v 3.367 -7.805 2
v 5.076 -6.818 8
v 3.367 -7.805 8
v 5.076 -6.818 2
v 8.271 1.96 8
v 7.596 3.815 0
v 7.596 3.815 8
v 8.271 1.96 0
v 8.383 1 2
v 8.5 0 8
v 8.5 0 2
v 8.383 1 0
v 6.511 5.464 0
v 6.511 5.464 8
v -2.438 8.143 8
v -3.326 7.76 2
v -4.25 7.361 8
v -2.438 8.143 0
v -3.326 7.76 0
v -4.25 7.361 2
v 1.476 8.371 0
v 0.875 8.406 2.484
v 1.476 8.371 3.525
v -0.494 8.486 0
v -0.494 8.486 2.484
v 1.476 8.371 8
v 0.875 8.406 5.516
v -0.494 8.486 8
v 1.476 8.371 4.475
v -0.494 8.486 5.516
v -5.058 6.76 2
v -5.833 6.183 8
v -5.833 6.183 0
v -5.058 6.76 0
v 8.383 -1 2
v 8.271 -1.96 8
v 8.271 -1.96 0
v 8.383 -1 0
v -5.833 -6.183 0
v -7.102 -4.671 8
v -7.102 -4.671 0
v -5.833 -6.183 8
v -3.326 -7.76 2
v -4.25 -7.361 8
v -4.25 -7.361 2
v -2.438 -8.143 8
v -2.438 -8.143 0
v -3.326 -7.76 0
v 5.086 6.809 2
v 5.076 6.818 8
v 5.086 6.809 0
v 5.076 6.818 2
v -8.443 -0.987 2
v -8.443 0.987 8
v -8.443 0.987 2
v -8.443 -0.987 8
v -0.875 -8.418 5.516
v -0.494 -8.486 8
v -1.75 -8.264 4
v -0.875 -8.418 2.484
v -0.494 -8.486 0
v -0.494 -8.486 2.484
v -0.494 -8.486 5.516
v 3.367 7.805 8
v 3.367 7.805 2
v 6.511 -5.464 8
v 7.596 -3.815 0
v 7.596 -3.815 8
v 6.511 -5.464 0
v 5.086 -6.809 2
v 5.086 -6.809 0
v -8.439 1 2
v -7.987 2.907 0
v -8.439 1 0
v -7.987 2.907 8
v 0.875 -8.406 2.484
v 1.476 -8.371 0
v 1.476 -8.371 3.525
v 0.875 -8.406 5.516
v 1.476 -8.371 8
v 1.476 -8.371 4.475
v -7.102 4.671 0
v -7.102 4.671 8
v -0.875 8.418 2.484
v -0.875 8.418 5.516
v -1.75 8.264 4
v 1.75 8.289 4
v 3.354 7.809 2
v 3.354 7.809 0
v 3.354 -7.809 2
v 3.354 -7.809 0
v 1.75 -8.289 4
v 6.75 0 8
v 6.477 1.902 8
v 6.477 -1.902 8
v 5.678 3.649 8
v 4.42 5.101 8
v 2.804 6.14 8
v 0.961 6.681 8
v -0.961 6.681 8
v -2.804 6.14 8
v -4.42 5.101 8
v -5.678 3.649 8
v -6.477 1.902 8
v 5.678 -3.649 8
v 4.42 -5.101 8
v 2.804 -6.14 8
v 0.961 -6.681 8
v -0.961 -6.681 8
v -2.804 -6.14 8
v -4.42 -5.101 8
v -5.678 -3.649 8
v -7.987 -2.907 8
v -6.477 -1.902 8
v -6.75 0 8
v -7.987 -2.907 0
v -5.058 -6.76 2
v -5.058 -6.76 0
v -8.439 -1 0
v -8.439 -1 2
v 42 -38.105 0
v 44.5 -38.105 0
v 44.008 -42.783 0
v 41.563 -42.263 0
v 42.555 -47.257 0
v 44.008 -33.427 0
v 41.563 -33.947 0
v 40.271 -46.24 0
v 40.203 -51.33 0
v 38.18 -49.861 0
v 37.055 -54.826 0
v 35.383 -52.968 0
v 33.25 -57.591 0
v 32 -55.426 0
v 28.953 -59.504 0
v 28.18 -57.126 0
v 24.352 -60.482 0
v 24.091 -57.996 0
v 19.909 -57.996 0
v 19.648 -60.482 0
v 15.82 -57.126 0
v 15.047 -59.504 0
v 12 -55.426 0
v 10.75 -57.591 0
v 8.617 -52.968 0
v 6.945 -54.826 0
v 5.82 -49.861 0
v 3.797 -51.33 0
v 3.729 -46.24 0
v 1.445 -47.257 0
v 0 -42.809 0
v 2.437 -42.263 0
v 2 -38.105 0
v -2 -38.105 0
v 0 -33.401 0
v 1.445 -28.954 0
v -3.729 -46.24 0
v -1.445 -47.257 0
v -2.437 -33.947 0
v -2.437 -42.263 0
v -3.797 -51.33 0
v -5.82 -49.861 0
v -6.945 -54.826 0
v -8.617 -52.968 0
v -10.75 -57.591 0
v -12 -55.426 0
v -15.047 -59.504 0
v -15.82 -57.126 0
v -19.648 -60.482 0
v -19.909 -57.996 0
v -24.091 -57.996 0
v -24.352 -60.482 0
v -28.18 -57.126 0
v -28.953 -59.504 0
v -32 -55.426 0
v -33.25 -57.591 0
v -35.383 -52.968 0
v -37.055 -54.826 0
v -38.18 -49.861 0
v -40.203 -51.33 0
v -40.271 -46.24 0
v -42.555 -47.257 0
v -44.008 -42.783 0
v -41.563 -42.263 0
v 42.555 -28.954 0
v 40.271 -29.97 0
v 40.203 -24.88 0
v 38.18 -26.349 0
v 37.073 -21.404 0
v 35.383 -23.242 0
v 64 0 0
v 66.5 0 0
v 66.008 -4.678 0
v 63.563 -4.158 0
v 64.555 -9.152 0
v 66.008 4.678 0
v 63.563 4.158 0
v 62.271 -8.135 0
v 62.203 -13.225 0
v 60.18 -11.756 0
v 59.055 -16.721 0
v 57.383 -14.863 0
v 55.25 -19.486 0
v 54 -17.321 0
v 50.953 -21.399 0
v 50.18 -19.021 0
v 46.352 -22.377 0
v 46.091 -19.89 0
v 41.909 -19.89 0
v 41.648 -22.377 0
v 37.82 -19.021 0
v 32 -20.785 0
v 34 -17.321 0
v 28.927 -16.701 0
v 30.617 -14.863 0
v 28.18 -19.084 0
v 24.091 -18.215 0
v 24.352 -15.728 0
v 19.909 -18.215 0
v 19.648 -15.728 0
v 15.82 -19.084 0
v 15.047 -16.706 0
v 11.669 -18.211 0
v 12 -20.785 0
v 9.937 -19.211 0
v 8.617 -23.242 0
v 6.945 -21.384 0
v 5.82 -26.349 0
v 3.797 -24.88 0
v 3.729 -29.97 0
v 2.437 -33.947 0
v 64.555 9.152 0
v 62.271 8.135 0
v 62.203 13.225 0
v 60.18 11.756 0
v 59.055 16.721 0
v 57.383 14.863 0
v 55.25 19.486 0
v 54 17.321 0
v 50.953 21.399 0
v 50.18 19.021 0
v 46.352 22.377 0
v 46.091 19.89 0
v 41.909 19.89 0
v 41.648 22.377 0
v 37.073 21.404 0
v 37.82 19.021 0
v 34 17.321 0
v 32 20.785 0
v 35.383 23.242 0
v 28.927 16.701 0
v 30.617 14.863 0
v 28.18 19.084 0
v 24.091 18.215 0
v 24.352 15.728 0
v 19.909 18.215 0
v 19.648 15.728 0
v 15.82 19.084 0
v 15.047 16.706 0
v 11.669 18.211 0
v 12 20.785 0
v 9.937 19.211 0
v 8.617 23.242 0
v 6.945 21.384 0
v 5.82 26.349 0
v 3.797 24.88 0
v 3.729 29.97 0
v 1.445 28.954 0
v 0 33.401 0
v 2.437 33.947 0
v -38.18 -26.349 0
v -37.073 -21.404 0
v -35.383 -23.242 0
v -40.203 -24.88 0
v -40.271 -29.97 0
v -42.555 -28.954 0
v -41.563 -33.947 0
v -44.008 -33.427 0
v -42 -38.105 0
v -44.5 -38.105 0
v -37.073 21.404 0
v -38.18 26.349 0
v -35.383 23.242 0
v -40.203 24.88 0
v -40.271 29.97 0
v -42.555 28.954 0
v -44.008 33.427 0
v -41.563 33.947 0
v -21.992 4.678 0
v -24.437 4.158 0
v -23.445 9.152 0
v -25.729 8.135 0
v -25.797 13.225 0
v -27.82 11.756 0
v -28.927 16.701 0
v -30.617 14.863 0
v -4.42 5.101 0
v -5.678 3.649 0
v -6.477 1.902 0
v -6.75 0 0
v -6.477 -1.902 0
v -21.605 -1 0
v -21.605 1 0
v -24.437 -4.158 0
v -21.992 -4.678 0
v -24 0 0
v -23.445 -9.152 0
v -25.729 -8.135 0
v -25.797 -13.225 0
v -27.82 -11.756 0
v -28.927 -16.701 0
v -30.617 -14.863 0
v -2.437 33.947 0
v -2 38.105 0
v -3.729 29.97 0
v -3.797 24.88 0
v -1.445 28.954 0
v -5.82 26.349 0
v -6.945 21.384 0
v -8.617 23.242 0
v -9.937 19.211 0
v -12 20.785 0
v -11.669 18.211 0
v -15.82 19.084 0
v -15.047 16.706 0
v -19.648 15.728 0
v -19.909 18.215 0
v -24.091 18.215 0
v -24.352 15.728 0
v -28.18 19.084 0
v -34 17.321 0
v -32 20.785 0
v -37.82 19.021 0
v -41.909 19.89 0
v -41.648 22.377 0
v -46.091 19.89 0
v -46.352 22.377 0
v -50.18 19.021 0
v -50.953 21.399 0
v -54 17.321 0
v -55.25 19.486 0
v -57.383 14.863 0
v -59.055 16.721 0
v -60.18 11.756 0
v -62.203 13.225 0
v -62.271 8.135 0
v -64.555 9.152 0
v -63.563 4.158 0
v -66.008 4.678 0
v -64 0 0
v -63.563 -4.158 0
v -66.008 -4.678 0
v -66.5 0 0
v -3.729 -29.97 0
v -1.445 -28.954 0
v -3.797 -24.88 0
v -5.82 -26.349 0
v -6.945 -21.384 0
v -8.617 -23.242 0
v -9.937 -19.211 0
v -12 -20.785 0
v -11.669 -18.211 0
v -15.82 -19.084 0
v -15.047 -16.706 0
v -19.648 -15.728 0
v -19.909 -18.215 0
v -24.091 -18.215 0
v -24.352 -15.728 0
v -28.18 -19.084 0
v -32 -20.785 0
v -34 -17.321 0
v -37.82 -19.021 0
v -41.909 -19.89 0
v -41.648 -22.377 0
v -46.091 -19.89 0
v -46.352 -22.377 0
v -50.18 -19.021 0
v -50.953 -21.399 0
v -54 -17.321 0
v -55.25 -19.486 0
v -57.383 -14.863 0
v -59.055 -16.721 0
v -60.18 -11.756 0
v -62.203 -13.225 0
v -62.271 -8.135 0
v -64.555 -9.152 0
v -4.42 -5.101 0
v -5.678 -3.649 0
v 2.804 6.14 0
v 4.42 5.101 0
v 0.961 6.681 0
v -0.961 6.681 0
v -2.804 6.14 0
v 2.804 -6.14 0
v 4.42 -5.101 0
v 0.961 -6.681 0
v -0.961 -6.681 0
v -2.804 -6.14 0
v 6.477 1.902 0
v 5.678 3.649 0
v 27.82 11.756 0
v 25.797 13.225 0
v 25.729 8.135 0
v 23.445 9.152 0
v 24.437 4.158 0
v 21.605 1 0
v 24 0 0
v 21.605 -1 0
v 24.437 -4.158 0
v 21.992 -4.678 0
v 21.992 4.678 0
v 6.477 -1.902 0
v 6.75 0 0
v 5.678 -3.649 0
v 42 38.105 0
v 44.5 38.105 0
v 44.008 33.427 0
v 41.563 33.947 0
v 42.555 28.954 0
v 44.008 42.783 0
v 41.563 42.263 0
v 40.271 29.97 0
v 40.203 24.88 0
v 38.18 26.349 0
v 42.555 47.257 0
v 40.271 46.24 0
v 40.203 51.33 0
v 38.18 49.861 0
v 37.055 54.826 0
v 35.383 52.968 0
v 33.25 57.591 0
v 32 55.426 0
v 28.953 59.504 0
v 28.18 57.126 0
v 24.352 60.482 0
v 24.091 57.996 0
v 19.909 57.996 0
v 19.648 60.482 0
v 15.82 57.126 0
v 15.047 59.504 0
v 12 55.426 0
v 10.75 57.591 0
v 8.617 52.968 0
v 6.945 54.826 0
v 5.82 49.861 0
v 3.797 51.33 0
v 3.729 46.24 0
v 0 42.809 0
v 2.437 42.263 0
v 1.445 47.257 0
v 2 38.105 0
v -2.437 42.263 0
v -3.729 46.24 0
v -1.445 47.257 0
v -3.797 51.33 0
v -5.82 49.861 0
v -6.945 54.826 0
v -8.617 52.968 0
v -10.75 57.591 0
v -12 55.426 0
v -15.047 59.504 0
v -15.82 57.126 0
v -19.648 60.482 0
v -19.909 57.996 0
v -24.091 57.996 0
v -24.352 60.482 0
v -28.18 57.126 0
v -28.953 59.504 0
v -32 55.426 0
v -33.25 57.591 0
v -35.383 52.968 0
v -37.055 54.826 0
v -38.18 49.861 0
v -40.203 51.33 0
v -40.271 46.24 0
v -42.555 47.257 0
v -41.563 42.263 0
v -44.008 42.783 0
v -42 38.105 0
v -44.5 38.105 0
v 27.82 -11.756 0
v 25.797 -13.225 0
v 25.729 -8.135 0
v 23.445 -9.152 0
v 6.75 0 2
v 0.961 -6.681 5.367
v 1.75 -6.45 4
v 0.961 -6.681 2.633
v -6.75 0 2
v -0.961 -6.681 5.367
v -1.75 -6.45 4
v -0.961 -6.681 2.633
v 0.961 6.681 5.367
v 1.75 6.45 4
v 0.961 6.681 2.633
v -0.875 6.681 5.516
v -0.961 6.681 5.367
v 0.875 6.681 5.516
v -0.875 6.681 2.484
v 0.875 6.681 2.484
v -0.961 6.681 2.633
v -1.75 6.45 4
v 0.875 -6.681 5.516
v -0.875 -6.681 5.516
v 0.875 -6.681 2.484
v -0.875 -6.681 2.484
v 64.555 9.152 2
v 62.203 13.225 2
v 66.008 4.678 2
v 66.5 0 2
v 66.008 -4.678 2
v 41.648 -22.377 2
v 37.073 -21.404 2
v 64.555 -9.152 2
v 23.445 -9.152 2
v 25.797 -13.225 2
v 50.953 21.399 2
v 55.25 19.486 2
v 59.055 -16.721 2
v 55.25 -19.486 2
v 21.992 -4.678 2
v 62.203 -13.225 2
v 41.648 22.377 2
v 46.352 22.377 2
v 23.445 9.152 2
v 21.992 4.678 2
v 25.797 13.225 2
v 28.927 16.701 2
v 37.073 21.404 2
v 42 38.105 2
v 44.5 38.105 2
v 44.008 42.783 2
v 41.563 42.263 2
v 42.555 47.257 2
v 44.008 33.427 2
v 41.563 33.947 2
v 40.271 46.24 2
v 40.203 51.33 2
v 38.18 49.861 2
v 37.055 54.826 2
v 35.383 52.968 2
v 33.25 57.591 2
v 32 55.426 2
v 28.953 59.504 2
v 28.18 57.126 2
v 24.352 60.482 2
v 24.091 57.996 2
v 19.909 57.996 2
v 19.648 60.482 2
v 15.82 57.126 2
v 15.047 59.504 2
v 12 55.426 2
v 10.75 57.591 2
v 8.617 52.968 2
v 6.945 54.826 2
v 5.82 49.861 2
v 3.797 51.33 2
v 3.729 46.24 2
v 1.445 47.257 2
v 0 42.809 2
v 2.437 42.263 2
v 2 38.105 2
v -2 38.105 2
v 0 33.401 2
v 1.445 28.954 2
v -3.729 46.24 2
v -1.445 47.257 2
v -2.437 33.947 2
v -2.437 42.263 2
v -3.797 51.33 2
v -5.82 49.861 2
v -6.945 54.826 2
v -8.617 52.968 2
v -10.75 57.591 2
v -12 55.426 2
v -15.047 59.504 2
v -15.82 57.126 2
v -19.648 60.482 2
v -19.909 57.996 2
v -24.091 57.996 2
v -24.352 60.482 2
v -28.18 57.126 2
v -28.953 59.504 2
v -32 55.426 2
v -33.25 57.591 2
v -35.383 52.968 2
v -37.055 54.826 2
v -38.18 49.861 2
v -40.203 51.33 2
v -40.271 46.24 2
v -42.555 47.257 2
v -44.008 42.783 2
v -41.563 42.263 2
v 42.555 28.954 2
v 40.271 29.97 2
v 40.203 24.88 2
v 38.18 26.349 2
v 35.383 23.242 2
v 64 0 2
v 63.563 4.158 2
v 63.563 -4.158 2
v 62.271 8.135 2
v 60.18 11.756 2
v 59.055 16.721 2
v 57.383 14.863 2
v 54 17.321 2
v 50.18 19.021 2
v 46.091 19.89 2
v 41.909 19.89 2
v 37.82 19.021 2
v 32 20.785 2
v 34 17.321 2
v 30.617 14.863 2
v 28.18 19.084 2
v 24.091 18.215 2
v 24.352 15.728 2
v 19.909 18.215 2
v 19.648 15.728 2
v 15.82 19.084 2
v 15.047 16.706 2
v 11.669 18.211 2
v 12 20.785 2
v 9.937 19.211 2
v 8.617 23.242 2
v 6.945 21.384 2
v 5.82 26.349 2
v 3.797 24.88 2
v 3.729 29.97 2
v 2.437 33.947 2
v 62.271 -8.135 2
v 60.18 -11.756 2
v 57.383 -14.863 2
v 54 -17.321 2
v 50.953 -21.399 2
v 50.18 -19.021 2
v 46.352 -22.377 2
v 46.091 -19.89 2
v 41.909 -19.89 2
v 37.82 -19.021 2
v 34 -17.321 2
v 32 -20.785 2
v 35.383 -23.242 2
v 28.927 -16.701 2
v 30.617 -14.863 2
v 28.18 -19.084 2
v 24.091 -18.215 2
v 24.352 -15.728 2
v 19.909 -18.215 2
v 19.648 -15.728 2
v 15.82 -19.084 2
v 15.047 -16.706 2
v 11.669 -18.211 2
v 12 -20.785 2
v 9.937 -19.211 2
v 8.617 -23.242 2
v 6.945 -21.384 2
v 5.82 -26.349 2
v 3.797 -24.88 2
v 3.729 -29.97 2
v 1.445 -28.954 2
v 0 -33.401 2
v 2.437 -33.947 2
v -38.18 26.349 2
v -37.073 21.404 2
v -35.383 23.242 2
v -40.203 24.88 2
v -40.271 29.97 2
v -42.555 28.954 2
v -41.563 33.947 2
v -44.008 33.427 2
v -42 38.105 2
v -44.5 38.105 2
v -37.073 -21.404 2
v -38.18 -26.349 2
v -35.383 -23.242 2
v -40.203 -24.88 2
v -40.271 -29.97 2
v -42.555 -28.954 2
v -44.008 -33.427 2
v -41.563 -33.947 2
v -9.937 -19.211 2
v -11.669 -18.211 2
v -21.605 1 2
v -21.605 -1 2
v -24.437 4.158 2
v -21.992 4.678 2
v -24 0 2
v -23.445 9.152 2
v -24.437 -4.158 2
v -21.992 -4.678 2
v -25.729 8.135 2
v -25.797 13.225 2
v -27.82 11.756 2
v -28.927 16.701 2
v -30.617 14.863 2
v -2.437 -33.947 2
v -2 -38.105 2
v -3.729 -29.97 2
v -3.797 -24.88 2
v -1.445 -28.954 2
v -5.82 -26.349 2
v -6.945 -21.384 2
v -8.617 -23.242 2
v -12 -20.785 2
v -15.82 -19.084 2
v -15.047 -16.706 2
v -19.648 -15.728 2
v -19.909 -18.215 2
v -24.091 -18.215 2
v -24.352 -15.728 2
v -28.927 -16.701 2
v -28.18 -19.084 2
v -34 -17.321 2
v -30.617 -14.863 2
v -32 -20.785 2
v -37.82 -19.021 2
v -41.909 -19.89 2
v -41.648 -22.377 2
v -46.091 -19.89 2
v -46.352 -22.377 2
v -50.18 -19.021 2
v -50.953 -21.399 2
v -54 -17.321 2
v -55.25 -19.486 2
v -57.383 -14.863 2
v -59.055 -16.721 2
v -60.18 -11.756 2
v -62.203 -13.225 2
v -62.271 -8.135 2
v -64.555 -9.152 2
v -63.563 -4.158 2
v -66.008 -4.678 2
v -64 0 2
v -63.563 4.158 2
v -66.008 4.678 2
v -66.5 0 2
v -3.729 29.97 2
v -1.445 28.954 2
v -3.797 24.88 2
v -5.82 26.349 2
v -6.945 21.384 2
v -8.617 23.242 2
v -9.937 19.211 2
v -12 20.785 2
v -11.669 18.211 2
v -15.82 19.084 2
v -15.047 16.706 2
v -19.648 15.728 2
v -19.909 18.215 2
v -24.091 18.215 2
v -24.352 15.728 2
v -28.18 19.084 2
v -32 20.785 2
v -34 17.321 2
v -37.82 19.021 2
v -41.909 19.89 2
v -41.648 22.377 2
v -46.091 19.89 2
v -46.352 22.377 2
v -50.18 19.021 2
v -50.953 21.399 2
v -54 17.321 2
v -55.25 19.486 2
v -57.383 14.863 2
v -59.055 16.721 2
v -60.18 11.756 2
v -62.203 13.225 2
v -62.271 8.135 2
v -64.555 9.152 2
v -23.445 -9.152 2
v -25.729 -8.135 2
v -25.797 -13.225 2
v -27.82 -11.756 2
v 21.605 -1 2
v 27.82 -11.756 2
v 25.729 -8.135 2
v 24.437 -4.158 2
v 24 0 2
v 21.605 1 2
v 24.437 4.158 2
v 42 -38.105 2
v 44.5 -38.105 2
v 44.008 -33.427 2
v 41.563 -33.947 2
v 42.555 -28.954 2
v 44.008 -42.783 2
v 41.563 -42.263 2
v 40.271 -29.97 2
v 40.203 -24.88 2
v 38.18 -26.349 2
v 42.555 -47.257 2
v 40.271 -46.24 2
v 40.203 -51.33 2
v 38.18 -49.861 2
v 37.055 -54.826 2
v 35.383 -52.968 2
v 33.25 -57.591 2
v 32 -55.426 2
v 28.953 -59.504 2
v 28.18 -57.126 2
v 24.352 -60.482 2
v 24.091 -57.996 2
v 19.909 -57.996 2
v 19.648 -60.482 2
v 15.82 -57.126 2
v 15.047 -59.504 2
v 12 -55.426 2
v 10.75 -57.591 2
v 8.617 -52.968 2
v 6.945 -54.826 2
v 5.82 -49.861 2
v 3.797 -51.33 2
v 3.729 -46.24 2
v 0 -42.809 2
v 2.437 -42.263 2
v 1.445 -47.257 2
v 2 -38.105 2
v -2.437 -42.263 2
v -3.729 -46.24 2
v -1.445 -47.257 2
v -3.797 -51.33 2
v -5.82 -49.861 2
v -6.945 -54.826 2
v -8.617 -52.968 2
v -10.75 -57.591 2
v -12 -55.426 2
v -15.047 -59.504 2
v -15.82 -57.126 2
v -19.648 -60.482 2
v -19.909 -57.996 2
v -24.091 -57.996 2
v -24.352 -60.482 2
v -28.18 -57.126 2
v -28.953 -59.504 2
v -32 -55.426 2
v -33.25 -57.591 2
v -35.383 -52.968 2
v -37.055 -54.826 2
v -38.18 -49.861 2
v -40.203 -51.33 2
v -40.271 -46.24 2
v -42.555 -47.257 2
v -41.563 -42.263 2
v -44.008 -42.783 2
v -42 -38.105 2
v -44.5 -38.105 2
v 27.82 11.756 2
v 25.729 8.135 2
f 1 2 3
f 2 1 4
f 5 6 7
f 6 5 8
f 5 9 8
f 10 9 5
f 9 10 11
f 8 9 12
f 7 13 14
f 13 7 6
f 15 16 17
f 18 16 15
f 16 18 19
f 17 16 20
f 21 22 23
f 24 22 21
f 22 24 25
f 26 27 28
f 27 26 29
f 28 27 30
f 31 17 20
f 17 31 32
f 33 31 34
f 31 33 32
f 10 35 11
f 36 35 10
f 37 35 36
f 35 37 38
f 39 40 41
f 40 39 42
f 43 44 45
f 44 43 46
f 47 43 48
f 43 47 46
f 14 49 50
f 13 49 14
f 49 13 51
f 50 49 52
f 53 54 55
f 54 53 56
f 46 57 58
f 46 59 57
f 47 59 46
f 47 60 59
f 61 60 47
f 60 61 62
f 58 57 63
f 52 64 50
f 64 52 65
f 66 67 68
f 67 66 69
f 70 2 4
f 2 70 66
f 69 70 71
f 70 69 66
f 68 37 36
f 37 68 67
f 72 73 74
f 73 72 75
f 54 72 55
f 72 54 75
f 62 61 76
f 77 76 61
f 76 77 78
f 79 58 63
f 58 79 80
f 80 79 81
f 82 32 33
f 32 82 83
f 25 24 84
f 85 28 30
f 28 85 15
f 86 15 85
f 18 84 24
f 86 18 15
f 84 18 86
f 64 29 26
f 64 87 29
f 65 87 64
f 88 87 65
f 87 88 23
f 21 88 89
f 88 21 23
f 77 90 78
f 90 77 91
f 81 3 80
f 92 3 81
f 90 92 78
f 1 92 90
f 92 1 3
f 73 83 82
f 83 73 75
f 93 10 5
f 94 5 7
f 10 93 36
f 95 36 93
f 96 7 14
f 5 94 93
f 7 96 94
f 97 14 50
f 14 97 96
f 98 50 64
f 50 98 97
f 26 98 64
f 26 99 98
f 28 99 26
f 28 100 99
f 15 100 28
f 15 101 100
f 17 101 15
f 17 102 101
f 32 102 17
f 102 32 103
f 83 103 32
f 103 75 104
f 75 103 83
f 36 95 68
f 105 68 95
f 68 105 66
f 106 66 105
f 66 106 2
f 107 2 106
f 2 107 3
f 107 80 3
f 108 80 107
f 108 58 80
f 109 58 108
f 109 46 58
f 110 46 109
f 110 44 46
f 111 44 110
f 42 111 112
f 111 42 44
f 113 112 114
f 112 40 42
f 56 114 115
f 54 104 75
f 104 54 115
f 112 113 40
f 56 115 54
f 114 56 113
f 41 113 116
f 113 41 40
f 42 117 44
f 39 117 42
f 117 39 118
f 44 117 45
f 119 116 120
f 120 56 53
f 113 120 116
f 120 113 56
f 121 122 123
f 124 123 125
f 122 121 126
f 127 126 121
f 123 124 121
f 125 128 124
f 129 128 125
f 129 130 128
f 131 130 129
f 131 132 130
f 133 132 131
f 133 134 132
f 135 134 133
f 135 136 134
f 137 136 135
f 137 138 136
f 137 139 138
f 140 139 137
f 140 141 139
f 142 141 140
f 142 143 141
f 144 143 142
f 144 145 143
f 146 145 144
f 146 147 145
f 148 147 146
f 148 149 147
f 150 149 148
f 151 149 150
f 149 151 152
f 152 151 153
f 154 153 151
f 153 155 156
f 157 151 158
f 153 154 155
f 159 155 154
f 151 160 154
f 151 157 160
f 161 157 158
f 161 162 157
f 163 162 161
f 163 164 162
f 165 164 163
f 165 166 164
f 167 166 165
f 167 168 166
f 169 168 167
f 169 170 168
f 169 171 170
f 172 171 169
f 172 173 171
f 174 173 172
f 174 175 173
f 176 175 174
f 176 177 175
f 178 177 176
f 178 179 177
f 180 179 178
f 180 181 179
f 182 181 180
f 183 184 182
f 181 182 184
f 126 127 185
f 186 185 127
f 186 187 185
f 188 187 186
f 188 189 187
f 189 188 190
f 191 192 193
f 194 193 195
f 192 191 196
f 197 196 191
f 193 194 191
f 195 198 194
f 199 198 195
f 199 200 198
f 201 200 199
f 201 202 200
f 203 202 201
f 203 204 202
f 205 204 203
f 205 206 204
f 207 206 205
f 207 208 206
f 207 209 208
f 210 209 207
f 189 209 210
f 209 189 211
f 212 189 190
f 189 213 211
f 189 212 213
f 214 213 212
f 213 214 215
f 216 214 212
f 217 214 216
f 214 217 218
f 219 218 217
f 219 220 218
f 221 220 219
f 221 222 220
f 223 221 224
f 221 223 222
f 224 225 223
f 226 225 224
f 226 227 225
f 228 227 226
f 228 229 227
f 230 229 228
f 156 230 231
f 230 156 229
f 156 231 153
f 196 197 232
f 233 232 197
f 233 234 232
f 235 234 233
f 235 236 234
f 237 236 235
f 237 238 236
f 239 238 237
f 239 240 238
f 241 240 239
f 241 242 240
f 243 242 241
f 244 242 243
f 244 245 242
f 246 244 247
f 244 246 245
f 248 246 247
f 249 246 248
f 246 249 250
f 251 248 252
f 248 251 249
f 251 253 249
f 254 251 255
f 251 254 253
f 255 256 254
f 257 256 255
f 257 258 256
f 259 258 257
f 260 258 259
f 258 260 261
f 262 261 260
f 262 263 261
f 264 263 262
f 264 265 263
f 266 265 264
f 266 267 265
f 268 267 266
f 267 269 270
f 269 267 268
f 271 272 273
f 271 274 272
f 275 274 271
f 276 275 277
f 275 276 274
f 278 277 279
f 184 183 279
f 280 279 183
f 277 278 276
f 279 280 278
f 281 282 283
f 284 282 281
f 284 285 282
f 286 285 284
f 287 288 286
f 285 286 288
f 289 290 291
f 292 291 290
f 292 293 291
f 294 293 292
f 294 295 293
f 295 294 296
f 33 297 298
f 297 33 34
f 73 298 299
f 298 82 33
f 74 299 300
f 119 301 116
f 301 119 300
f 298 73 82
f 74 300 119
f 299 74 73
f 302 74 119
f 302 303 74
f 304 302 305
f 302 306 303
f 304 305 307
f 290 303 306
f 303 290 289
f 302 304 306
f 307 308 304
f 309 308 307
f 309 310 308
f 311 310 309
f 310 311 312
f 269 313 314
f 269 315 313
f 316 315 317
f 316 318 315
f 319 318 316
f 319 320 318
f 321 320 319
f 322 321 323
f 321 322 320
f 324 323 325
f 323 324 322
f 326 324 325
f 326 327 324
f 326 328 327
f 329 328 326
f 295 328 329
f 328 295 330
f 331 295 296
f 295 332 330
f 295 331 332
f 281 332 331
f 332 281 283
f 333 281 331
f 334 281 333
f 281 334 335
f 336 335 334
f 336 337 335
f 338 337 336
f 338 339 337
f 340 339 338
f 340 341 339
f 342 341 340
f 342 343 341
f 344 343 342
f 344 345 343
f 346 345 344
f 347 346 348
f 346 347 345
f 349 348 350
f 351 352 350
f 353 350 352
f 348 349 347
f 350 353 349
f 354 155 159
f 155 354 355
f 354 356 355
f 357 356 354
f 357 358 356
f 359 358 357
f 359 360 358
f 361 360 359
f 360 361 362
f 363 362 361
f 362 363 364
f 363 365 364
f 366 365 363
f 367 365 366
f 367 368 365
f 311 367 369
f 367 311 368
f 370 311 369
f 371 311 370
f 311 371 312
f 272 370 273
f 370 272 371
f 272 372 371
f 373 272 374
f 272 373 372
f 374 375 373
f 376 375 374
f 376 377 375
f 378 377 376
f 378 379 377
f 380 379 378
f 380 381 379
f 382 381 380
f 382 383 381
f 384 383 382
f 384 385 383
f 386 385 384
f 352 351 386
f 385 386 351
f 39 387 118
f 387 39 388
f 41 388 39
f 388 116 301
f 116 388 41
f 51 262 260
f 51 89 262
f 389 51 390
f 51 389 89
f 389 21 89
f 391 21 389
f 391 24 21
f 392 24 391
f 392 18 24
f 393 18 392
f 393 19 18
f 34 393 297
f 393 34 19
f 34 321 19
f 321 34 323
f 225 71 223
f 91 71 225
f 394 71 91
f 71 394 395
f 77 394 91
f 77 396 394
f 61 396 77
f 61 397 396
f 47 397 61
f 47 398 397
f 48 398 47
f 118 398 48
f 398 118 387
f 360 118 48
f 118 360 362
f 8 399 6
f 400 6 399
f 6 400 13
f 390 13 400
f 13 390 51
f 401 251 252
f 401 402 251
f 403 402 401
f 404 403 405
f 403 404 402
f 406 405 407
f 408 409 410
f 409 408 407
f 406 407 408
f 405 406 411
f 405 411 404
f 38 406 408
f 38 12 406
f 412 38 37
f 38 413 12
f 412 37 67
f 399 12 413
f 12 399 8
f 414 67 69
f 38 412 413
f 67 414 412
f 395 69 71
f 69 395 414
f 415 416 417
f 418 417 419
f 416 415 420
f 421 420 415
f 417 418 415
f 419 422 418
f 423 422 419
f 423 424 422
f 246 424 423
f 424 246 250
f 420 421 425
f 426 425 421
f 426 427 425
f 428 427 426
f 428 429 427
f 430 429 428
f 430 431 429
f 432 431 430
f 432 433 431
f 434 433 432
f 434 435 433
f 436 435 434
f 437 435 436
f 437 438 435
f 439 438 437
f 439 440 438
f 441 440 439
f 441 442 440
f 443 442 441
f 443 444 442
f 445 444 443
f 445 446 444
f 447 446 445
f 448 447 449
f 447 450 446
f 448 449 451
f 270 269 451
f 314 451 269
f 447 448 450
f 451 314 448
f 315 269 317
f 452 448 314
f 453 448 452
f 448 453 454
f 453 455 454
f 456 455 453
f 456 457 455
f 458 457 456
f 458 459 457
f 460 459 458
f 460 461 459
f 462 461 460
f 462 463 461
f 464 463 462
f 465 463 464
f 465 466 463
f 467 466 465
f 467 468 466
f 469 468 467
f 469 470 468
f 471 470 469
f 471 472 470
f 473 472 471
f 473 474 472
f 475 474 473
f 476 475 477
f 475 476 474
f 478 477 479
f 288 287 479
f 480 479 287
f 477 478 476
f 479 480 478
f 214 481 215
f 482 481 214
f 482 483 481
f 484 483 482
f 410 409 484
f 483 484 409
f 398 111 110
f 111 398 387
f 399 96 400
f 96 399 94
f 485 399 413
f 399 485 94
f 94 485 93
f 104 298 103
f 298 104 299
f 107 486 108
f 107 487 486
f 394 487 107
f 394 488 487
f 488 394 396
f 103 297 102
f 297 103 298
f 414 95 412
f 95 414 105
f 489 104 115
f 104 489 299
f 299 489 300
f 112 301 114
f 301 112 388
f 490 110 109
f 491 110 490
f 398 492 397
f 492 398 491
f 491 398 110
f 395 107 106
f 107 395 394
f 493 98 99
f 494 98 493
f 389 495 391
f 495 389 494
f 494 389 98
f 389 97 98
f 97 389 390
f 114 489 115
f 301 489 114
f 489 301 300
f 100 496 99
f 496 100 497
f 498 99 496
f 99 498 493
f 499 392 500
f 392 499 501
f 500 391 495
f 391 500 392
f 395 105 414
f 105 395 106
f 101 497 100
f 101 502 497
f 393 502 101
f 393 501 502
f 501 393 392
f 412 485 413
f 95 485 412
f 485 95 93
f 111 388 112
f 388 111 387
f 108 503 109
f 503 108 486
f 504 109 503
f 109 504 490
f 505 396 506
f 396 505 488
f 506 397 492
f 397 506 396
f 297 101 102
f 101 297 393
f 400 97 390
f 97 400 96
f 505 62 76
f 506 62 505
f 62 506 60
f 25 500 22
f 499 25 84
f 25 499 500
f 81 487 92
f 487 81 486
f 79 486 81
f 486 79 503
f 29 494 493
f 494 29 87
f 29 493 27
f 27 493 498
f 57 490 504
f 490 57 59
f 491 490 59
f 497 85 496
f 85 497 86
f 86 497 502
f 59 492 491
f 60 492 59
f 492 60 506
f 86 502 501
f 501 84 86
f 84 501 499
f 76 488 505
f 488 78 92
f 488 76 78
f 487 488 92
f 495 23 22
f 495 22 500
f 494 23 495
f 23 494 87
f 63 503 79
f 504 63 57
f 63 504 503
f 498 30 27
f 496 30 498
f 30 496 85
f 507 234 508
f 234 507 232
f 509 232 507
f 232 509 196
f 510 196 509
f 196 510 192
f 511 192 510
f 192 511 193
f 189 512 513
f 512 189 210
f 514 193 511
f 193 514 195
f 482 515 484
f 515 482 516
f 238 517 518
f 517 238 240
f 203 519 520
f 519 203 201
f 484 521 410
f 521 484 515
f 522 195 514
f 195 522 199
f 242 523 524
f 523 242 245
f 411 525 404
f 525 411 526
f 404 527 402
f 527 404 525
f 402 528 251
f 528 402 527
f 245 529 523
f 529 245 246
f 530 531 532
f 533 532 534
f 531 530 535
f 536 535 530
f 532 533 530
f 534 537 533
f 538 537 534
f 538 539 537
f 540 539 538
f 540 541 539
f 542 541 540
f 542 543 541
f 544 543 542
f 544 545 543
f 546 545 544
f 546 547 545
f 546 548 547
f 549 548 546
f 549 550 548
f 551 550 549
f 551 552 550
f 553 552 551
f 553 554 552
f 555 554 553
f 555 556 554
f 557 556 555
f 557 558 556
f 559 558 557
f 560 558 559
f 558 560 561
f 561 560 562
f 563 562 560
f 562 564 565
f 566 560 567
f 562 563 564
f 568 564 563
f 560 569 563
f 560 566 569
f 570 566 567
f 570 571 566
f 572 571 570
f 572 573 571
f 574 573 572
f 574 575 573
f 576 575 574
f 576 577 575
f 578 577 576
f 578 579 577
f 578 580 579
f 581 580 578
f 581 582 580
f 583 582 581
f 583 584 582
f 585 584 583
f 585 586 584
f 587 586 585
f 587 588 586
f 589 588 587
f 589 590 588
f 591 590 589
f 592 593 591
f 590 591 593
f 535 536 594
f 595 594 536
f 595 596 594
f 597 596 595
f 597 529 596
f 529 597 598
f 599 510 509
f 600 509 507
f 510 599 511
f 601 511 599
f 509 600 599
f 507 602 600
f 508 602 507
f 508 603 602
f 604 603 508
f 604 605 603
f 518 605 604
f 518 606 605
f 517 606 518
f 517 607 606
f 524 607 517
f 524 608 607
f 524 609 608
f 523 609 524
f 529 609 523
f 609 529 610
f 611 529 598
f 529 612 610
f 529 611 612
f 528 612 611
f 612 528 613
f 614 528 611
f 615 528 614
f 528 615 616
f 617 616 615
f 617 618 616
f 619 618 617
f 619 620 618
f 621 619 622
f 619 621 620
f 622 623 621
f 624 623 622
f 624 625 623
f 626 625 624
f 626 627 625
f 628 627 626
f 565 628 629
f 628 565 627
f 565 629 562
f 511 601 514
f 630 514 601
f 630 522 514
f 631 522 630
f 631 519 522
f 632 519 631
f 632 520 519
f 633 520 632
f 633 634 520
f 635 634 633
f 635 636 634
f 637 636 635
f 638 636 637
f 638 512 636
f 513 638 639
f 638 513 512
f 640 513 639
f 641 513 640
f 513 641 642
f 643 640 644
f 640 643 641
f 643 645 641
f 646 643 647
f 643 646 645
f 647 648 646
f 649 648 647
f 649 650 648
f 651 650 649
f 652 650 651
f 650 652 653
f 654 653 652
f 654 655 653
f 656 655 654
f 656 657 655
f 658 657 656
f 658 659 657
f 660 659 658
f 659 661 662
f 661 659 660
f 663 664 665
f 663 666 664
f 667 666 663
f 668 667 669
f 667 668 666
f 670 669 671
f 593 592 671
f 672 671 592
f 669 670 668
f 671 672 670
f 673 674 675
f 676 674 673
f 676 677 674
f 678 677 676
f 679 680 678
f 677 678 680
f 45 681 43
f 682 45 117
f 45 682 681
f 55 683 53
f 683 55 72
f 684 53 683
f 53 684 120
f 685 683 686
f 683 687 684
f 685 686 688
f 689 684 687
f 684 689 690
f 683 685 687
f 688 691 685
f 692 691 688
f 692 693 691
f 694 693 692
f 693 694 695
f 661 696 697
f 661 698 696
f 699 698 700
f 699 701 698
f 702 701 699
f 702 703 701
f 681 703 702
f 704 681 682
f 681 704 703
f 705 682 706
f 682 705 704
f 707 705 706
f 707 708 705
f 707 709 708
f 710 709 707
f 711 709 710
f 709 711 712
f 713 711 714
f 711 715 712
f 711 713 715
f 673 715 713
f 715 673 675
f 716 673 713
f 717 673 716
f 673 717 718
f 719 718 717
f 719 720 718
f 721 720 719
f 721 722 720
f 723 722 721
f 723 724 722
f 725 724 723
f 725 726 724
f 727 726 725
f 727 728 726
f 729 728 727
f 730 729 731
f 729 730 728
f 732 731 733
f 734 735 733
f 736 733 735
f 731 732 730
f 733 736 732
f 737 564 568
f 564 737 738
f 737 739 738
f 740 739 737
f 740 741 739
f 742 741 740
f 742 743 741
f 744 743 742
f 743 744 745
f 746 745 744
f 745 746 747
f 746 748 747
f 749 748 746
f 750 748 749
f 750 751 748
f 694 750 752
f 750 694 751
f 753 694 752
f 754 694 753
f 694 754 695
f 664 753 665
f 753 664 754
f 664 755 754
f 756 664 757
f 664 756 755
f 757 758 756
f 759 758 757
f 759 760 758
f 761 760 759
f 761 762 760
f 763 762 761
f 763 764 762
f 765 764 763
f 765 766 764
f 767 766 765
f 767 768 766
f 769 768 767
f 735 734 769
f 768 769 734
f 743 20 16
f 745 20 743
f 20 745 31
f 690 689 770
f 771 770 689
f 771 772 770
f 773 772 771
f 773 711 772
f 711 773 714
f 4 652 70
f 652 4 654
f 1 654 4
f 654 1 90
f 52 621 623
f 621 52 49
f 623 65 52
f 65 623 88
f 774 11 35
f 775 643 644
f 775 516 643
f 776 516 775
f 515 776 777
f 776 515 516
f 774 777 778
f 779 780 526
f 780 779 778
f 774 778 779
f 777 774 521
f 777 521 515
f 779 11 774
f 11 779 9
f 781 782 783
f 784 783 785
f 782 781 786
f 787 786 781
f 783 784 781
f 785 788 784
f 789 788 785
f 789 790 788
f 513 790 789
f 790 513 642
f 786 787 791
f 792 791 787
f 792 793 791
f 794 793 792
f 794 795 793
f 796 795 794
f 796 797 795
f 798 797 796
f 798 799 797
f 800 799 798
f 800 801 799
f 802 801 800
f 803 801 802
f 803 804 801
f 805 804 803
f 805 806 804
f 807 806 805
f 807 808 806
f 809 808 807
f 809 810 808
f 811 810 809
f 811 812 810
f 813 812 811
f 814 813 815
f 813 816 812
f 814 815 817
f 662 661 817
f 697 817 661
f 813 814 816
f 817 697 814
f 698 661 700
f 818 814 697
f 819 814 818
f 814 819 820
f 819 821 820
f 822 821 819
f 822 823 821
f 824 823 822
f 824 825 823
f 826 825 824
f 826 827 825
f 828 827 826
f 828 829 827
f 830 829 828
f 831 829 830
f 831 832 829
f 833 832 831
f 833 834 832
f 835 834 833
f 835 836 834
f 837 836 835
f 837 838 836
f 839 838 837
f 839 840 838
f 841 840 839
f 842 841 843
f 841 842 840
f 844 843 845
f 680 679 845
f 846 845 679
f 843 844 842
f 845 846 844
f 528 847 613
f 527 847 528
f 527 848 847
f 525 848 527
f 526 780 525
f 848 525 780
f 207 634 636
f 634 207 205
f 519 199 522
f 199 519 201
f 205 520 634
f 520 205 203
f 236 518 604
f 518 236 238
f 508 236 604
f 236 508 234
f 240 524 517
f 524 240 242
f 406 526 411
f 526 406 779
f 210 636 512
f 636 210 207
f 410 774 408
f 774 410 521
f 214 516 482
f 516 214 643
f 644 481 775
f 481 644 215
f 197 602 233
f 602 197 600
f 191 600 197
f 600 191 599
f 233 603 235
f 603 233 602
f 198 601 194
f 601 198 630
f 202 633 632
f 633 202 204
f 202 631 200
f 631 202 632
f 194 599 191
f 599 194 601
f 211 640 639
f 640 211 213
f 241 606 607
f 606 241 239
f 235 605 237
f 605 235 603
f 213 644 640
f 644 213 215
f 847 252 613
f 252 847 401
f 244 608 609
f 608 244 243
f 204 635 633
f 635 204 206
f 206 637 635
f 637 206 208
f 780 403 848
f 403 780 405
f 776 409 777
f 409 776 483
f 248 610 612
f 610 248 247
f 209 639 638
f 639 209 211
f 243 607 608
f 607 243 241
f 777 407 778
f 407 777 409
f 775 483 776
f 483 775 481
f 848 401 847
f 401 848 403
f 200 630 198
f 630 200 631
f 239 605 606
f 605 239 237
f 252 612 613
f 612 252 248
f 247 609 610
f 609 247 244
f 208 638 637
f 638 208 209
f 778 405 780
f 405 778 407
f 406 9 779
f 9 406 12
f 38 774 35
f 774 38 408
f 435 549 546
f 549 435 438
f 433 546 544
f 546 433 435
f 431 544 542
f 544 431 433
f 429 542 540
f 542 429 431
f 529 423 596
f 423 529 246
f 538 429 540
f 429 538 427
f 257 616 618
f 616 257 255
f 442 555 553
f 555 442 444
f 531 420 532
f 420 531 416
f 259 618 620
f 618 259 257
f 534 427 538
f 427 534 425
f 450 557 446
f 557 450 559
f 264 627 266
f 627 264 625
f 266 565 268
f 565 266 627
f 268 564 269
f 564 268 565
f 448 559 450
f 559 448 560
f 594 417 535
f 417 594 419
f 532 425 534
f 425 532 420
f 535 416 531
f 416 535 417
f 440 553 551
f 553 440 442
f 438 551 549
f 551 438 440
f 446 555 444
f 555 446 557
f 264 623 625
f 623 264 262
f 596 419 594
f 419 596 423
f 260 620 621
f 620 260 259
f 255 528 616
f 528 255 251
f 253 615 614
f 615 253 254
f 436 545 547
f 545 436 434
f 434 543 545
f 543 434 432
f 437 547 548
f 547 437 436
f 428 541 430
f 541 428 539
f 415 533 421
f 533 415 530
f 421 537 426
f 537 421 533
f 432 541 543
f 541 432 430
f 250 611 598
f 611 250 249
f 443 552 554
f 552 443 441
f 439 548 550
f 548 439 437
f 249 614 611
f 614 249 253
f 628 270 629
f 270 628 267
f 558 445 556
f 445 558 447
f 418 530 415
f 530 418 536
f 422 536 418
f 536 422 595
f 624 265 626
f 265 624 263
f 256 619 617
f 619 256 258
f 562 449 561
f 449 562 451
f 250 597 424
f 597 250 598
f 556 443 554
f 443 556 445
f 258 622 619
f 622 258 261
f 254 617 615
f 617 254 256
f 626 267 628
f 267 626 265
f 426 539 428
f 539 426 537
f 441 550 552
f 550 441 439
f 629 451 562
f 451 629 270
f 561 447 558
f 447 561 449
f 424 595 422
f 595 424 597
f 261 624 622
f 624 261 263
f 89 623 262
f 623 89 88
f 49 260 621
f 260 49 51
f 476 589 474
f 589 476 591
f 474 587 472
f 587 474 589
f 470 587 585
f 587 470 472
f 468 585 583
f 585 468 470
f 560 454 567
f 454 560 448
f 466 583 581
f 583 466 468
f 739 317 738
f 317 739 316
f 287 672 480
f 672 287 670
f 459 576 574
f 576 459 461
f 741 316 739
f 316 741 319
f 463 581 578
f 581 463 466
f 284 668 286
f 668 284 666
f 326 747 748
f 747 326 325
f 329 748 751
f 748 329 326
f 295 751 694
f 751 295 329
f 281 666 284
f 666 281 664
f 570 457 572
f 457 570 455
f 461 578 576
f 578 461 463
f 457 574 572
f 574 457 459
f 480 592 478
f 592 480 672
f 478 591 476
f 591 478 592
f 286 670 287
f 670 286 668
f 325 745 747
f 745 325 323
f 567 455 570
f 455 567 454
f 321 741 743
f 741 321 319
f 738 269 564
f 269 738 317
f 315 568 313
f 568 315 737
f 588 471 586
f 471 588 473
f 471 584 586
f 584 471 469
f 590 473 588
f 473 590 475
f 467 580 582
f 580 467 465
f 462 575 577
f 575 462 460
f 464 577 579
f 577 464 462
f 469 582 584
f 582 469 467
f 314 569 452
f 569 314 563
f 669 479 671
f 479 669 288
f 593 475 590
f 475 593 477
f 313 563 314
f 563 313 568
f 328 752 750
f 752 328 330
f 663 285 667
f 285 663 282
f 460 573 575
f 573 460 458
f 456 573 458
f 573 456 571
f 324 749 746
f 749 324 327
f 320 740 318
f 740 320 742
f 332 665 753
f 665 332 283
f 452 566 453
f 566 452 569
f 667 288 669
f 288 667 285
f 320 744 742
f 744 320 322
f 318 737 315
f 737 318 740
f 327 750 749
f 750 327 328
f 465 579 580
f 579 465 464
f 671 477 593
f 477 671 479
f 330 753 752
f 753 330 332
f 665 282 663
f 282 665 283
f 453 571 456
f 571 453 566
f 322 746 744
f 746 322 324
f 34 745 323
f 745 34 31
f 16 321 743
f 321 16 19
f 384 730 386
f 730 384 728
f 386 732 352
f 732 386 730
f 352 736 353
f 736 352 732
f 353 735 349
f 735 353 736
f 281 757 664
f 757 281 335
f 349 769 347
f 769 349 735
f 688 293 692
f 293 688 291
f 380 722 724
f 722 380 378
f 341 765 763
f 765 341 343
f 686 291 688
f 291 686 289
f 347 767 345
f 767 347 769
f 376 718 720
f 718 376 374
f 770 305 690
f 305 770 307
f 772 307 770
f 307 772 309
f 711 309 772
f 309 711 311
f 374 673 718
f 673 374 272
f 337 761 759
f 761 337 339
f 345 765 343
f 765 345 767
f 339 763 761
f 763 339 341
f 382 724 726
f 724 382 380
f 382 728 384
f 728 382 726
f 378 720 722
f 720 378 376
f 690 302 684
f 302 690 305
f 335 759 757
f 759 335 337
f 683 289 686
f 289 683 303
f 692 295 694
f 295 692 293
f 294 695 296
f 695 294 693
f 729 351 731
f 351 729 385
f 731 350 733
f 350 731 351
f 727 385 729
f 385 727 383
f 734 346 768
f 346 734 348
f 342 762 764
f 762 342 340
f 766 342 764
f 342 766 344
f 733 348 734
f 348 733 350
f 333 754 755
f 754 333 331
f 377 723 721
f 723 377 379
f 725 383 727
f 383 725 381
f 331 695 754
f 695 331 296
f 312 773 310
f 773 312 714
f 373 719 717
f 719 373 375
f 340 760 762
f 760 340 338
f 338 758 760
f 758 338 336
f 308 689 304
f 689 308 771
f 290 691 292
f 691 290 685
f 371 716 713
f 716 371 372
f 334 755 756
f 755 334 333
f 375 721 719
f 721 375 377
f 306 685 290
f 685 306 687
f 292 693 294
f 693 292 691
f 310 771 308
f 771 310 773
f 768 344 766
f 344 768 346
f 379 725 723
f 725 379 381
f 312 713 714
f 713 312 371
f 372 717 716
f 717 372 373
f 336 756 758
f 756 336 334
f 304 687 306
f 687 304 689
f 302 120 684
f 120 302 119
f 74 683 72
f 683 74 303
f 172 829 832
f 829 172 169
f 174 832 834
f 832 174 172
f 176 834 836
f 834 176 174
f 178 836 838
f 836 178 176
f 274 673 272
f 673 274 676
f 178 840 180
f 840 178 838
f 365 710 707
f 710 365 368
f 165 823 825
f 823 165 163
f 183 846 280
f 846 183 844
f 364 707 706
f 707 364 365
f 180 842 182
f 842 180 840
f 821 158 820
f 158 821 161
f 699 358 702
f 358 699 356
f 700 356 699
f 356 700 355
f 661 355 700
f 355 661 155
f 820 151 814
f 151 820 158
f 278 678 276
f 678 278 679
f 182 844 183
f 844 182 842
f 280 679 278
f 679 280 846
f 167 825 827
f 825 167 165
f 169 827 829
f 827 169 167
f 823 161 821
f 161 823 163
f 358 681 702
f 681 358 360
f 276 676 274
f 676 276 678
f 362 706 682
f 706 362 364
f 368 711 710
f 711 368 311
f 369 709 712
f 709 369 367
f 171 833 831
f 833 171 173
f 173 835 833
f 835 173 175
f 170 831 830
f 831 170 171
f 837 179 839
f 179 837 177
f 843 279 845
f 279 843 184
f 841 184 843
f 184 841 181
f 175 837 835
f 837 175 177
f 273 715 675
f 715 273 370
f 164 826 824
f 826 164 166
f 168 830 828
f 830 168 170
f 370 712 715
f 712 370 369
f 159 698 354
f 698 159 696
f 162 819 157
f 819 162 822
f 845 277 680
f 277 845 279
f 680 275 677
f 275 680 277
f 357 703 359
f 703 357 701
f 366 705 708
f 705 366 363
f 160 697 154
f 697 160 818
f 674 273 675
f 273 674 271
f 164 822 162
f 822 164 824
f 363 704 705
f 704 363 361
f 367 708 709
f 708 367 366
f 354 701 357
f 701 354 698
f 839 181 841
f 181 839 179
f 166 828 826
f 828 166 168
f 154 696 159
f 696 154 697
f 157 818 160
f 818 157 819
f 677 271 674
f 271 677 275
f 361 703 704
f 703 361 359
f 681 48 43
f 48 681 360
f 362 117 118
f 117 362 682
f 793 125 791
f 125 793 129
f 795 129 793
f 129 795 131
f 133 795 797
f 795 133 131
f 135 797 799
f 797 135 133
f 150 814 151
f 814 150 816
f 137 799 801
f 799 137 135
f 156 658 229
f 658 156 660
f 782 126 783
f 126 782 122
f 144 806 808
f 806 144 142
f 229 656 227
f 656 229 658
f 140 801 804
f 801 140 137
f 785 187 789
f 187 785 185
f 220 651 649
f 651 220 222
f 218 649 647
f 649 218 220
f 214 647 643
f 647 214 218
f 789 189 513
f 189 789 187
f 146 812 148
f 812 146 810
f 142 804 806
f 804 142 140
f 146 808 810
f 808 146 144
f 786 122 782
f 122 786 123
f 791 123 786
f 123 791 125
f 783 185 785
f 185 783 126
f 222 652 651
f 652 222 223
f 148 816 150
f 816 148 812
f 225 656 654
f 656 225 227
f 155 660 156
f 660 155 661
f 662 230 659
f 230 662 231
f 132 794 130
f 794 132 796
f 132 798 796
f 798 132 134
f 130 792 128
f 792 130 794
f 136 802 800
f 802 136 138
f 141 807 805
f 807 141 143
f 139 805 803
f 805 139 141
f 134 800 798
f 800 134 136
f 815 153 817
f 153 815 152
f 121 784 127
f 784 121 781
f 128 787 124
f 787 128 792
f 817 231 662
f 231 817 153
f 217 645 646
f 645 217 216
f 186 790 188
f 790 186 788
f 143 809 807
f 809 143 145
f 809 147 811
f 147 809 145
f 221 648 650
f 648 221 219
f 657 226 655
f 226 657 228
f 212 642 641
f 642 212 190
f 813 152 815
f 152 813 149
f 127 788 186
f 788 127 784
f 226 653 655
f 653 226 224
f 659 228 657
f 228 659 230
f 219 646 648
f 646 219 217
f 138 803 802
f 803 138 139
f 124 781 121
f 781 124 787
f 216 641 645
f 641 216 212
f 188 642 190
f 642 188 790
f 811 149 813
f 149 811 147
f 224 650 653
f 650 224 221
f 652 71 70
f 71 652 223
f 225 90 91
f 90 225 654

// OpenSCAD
union() {
	difference() {
		cylinder(d = 17, h = 8);
		translate(v = [0, 0, -8]) {
			cylinder(d = 13.5000000000, h = 16);
		}
		translate(v = [0, 10, 0]) {
			translate(v = [0, 0, 4.0000000000]) {
				rotate(a = [90, 0, 0]) {
					cylinder(d = 3.5000000000, h = 20);
				}
			}
		}
	}
	translate(v = [44, 0, 0]) {
		difference() {
			cylinder(d = 45, h = 2);
			translate(v = [0, 0, -2]) {
				cylinder(d = 40, h = 4);
			}
		}
	}
	translate(v = [0, 0, 1.0000000000]) {
		translate(v = [14.3750000000, 0, 0]) {
			cube(center = true, size = [15.2500000000, 2, 2]);
		}
	}
	rotate(a = [0, 0, 0.0000000000]) {
		union() {
			translate(v = [44, 0, 0]) {
				difference() {
					cylinder(d = 45, h = 2);
					translate(v = [0, 0, -2]) {
						cylinder(d = 40, h = 4);
					}
				}
			}
			translate(v = [0, 0, 1.0000000000]) {
				translate(v = [14.3750000000, 0, 0]) {
					cube(center = true, size = [15.2500000000, 2, 2]);
				}
			}
		}
	}
	rotate(a = [0, 0, 60.0000000000]) {
		union() {
			translate(v = [44, 0, 0]) {
				difference() {
					cylinder(d = 45, h = 2);
					translate(v = [0, 0, -2]) {
						cylinder(d = 40, h = 4);
					}
				}
			}
			translate(v = [0, 0, 1.0000000000]) {
				translate(v = [14.3750000000, 0, 0]) {
					cube(center = true, size = [15.2500000000, 2, 2]);
				}
			}
		}
	}
	rotate(a = [0, 0, 120.0000000000]) {
		union() {
			translate(v = [44, 0, 0]) {
				difference() {
					cylinder(d = 45, h = 2);
					translate(v = [0, 0, -2]) {
						cylinder(d = 40, h = 4);
					}
				}
			}
			translate(v = [0, 0, 1.0000000000]) {
				translate(v = [14.3750000000, 0, 0]) {
					cube(center = true, size = [15.2500000000, 2, 2]);
				}
			}
		}
	}
	rotate(a = [0, 0, 180.0000000000]) {
		union() {
			translate(v = [44, 0, 0]) {
				difference() {
					cylinder(d = 45, h = 2);
					translate(v = [0, 0, -2]) {
						cylinder(d = 40, h = 4);
					}
				}
			}
			translate(v = [0, 0, 1.0000000000]) {
				translate(v = [14.3750000000, 0, 0]) {
					cube(center = true, size = [15.2500000000, 2, 2]);
				}
			}
		}
	}
	rotate(a = [0, 0, 240.0000000000]) {
		union() {
			translate(v = [44, 0, 0]) {
				difference() {
					cylinder(d = 45, h = 2);
					translate(v = [0, 0, -2]) {
						cylinder(d = 40, h = 4);
					}
				}
			}
			translate(v = [0, 0, 1.0000000000]) {
				translate(v = [14.3750000000, 0, 0]) {
					cube(center = true, size = [15.2500000000, 2, 2]);
				}
			}
		}
	}
	rotate(a = [0, 0, 300.0000000000]) {
		union() {
			translate(v = [44, 0, 0]) {
				difference() {
					cylinder(d = 45, h = 2);
					translate(v = [0, 0, -2]) {
						cylinder(d = 40, h = 4);
					}
				}
			}
			translate(v = [0, 0, 1.0000000000]) {
				translate(v = [14.3750000000, 0, 0]) {
					cube(center = true, size = [15.2500000000, 2, 2]);
				}
			}
		}
	}
}
